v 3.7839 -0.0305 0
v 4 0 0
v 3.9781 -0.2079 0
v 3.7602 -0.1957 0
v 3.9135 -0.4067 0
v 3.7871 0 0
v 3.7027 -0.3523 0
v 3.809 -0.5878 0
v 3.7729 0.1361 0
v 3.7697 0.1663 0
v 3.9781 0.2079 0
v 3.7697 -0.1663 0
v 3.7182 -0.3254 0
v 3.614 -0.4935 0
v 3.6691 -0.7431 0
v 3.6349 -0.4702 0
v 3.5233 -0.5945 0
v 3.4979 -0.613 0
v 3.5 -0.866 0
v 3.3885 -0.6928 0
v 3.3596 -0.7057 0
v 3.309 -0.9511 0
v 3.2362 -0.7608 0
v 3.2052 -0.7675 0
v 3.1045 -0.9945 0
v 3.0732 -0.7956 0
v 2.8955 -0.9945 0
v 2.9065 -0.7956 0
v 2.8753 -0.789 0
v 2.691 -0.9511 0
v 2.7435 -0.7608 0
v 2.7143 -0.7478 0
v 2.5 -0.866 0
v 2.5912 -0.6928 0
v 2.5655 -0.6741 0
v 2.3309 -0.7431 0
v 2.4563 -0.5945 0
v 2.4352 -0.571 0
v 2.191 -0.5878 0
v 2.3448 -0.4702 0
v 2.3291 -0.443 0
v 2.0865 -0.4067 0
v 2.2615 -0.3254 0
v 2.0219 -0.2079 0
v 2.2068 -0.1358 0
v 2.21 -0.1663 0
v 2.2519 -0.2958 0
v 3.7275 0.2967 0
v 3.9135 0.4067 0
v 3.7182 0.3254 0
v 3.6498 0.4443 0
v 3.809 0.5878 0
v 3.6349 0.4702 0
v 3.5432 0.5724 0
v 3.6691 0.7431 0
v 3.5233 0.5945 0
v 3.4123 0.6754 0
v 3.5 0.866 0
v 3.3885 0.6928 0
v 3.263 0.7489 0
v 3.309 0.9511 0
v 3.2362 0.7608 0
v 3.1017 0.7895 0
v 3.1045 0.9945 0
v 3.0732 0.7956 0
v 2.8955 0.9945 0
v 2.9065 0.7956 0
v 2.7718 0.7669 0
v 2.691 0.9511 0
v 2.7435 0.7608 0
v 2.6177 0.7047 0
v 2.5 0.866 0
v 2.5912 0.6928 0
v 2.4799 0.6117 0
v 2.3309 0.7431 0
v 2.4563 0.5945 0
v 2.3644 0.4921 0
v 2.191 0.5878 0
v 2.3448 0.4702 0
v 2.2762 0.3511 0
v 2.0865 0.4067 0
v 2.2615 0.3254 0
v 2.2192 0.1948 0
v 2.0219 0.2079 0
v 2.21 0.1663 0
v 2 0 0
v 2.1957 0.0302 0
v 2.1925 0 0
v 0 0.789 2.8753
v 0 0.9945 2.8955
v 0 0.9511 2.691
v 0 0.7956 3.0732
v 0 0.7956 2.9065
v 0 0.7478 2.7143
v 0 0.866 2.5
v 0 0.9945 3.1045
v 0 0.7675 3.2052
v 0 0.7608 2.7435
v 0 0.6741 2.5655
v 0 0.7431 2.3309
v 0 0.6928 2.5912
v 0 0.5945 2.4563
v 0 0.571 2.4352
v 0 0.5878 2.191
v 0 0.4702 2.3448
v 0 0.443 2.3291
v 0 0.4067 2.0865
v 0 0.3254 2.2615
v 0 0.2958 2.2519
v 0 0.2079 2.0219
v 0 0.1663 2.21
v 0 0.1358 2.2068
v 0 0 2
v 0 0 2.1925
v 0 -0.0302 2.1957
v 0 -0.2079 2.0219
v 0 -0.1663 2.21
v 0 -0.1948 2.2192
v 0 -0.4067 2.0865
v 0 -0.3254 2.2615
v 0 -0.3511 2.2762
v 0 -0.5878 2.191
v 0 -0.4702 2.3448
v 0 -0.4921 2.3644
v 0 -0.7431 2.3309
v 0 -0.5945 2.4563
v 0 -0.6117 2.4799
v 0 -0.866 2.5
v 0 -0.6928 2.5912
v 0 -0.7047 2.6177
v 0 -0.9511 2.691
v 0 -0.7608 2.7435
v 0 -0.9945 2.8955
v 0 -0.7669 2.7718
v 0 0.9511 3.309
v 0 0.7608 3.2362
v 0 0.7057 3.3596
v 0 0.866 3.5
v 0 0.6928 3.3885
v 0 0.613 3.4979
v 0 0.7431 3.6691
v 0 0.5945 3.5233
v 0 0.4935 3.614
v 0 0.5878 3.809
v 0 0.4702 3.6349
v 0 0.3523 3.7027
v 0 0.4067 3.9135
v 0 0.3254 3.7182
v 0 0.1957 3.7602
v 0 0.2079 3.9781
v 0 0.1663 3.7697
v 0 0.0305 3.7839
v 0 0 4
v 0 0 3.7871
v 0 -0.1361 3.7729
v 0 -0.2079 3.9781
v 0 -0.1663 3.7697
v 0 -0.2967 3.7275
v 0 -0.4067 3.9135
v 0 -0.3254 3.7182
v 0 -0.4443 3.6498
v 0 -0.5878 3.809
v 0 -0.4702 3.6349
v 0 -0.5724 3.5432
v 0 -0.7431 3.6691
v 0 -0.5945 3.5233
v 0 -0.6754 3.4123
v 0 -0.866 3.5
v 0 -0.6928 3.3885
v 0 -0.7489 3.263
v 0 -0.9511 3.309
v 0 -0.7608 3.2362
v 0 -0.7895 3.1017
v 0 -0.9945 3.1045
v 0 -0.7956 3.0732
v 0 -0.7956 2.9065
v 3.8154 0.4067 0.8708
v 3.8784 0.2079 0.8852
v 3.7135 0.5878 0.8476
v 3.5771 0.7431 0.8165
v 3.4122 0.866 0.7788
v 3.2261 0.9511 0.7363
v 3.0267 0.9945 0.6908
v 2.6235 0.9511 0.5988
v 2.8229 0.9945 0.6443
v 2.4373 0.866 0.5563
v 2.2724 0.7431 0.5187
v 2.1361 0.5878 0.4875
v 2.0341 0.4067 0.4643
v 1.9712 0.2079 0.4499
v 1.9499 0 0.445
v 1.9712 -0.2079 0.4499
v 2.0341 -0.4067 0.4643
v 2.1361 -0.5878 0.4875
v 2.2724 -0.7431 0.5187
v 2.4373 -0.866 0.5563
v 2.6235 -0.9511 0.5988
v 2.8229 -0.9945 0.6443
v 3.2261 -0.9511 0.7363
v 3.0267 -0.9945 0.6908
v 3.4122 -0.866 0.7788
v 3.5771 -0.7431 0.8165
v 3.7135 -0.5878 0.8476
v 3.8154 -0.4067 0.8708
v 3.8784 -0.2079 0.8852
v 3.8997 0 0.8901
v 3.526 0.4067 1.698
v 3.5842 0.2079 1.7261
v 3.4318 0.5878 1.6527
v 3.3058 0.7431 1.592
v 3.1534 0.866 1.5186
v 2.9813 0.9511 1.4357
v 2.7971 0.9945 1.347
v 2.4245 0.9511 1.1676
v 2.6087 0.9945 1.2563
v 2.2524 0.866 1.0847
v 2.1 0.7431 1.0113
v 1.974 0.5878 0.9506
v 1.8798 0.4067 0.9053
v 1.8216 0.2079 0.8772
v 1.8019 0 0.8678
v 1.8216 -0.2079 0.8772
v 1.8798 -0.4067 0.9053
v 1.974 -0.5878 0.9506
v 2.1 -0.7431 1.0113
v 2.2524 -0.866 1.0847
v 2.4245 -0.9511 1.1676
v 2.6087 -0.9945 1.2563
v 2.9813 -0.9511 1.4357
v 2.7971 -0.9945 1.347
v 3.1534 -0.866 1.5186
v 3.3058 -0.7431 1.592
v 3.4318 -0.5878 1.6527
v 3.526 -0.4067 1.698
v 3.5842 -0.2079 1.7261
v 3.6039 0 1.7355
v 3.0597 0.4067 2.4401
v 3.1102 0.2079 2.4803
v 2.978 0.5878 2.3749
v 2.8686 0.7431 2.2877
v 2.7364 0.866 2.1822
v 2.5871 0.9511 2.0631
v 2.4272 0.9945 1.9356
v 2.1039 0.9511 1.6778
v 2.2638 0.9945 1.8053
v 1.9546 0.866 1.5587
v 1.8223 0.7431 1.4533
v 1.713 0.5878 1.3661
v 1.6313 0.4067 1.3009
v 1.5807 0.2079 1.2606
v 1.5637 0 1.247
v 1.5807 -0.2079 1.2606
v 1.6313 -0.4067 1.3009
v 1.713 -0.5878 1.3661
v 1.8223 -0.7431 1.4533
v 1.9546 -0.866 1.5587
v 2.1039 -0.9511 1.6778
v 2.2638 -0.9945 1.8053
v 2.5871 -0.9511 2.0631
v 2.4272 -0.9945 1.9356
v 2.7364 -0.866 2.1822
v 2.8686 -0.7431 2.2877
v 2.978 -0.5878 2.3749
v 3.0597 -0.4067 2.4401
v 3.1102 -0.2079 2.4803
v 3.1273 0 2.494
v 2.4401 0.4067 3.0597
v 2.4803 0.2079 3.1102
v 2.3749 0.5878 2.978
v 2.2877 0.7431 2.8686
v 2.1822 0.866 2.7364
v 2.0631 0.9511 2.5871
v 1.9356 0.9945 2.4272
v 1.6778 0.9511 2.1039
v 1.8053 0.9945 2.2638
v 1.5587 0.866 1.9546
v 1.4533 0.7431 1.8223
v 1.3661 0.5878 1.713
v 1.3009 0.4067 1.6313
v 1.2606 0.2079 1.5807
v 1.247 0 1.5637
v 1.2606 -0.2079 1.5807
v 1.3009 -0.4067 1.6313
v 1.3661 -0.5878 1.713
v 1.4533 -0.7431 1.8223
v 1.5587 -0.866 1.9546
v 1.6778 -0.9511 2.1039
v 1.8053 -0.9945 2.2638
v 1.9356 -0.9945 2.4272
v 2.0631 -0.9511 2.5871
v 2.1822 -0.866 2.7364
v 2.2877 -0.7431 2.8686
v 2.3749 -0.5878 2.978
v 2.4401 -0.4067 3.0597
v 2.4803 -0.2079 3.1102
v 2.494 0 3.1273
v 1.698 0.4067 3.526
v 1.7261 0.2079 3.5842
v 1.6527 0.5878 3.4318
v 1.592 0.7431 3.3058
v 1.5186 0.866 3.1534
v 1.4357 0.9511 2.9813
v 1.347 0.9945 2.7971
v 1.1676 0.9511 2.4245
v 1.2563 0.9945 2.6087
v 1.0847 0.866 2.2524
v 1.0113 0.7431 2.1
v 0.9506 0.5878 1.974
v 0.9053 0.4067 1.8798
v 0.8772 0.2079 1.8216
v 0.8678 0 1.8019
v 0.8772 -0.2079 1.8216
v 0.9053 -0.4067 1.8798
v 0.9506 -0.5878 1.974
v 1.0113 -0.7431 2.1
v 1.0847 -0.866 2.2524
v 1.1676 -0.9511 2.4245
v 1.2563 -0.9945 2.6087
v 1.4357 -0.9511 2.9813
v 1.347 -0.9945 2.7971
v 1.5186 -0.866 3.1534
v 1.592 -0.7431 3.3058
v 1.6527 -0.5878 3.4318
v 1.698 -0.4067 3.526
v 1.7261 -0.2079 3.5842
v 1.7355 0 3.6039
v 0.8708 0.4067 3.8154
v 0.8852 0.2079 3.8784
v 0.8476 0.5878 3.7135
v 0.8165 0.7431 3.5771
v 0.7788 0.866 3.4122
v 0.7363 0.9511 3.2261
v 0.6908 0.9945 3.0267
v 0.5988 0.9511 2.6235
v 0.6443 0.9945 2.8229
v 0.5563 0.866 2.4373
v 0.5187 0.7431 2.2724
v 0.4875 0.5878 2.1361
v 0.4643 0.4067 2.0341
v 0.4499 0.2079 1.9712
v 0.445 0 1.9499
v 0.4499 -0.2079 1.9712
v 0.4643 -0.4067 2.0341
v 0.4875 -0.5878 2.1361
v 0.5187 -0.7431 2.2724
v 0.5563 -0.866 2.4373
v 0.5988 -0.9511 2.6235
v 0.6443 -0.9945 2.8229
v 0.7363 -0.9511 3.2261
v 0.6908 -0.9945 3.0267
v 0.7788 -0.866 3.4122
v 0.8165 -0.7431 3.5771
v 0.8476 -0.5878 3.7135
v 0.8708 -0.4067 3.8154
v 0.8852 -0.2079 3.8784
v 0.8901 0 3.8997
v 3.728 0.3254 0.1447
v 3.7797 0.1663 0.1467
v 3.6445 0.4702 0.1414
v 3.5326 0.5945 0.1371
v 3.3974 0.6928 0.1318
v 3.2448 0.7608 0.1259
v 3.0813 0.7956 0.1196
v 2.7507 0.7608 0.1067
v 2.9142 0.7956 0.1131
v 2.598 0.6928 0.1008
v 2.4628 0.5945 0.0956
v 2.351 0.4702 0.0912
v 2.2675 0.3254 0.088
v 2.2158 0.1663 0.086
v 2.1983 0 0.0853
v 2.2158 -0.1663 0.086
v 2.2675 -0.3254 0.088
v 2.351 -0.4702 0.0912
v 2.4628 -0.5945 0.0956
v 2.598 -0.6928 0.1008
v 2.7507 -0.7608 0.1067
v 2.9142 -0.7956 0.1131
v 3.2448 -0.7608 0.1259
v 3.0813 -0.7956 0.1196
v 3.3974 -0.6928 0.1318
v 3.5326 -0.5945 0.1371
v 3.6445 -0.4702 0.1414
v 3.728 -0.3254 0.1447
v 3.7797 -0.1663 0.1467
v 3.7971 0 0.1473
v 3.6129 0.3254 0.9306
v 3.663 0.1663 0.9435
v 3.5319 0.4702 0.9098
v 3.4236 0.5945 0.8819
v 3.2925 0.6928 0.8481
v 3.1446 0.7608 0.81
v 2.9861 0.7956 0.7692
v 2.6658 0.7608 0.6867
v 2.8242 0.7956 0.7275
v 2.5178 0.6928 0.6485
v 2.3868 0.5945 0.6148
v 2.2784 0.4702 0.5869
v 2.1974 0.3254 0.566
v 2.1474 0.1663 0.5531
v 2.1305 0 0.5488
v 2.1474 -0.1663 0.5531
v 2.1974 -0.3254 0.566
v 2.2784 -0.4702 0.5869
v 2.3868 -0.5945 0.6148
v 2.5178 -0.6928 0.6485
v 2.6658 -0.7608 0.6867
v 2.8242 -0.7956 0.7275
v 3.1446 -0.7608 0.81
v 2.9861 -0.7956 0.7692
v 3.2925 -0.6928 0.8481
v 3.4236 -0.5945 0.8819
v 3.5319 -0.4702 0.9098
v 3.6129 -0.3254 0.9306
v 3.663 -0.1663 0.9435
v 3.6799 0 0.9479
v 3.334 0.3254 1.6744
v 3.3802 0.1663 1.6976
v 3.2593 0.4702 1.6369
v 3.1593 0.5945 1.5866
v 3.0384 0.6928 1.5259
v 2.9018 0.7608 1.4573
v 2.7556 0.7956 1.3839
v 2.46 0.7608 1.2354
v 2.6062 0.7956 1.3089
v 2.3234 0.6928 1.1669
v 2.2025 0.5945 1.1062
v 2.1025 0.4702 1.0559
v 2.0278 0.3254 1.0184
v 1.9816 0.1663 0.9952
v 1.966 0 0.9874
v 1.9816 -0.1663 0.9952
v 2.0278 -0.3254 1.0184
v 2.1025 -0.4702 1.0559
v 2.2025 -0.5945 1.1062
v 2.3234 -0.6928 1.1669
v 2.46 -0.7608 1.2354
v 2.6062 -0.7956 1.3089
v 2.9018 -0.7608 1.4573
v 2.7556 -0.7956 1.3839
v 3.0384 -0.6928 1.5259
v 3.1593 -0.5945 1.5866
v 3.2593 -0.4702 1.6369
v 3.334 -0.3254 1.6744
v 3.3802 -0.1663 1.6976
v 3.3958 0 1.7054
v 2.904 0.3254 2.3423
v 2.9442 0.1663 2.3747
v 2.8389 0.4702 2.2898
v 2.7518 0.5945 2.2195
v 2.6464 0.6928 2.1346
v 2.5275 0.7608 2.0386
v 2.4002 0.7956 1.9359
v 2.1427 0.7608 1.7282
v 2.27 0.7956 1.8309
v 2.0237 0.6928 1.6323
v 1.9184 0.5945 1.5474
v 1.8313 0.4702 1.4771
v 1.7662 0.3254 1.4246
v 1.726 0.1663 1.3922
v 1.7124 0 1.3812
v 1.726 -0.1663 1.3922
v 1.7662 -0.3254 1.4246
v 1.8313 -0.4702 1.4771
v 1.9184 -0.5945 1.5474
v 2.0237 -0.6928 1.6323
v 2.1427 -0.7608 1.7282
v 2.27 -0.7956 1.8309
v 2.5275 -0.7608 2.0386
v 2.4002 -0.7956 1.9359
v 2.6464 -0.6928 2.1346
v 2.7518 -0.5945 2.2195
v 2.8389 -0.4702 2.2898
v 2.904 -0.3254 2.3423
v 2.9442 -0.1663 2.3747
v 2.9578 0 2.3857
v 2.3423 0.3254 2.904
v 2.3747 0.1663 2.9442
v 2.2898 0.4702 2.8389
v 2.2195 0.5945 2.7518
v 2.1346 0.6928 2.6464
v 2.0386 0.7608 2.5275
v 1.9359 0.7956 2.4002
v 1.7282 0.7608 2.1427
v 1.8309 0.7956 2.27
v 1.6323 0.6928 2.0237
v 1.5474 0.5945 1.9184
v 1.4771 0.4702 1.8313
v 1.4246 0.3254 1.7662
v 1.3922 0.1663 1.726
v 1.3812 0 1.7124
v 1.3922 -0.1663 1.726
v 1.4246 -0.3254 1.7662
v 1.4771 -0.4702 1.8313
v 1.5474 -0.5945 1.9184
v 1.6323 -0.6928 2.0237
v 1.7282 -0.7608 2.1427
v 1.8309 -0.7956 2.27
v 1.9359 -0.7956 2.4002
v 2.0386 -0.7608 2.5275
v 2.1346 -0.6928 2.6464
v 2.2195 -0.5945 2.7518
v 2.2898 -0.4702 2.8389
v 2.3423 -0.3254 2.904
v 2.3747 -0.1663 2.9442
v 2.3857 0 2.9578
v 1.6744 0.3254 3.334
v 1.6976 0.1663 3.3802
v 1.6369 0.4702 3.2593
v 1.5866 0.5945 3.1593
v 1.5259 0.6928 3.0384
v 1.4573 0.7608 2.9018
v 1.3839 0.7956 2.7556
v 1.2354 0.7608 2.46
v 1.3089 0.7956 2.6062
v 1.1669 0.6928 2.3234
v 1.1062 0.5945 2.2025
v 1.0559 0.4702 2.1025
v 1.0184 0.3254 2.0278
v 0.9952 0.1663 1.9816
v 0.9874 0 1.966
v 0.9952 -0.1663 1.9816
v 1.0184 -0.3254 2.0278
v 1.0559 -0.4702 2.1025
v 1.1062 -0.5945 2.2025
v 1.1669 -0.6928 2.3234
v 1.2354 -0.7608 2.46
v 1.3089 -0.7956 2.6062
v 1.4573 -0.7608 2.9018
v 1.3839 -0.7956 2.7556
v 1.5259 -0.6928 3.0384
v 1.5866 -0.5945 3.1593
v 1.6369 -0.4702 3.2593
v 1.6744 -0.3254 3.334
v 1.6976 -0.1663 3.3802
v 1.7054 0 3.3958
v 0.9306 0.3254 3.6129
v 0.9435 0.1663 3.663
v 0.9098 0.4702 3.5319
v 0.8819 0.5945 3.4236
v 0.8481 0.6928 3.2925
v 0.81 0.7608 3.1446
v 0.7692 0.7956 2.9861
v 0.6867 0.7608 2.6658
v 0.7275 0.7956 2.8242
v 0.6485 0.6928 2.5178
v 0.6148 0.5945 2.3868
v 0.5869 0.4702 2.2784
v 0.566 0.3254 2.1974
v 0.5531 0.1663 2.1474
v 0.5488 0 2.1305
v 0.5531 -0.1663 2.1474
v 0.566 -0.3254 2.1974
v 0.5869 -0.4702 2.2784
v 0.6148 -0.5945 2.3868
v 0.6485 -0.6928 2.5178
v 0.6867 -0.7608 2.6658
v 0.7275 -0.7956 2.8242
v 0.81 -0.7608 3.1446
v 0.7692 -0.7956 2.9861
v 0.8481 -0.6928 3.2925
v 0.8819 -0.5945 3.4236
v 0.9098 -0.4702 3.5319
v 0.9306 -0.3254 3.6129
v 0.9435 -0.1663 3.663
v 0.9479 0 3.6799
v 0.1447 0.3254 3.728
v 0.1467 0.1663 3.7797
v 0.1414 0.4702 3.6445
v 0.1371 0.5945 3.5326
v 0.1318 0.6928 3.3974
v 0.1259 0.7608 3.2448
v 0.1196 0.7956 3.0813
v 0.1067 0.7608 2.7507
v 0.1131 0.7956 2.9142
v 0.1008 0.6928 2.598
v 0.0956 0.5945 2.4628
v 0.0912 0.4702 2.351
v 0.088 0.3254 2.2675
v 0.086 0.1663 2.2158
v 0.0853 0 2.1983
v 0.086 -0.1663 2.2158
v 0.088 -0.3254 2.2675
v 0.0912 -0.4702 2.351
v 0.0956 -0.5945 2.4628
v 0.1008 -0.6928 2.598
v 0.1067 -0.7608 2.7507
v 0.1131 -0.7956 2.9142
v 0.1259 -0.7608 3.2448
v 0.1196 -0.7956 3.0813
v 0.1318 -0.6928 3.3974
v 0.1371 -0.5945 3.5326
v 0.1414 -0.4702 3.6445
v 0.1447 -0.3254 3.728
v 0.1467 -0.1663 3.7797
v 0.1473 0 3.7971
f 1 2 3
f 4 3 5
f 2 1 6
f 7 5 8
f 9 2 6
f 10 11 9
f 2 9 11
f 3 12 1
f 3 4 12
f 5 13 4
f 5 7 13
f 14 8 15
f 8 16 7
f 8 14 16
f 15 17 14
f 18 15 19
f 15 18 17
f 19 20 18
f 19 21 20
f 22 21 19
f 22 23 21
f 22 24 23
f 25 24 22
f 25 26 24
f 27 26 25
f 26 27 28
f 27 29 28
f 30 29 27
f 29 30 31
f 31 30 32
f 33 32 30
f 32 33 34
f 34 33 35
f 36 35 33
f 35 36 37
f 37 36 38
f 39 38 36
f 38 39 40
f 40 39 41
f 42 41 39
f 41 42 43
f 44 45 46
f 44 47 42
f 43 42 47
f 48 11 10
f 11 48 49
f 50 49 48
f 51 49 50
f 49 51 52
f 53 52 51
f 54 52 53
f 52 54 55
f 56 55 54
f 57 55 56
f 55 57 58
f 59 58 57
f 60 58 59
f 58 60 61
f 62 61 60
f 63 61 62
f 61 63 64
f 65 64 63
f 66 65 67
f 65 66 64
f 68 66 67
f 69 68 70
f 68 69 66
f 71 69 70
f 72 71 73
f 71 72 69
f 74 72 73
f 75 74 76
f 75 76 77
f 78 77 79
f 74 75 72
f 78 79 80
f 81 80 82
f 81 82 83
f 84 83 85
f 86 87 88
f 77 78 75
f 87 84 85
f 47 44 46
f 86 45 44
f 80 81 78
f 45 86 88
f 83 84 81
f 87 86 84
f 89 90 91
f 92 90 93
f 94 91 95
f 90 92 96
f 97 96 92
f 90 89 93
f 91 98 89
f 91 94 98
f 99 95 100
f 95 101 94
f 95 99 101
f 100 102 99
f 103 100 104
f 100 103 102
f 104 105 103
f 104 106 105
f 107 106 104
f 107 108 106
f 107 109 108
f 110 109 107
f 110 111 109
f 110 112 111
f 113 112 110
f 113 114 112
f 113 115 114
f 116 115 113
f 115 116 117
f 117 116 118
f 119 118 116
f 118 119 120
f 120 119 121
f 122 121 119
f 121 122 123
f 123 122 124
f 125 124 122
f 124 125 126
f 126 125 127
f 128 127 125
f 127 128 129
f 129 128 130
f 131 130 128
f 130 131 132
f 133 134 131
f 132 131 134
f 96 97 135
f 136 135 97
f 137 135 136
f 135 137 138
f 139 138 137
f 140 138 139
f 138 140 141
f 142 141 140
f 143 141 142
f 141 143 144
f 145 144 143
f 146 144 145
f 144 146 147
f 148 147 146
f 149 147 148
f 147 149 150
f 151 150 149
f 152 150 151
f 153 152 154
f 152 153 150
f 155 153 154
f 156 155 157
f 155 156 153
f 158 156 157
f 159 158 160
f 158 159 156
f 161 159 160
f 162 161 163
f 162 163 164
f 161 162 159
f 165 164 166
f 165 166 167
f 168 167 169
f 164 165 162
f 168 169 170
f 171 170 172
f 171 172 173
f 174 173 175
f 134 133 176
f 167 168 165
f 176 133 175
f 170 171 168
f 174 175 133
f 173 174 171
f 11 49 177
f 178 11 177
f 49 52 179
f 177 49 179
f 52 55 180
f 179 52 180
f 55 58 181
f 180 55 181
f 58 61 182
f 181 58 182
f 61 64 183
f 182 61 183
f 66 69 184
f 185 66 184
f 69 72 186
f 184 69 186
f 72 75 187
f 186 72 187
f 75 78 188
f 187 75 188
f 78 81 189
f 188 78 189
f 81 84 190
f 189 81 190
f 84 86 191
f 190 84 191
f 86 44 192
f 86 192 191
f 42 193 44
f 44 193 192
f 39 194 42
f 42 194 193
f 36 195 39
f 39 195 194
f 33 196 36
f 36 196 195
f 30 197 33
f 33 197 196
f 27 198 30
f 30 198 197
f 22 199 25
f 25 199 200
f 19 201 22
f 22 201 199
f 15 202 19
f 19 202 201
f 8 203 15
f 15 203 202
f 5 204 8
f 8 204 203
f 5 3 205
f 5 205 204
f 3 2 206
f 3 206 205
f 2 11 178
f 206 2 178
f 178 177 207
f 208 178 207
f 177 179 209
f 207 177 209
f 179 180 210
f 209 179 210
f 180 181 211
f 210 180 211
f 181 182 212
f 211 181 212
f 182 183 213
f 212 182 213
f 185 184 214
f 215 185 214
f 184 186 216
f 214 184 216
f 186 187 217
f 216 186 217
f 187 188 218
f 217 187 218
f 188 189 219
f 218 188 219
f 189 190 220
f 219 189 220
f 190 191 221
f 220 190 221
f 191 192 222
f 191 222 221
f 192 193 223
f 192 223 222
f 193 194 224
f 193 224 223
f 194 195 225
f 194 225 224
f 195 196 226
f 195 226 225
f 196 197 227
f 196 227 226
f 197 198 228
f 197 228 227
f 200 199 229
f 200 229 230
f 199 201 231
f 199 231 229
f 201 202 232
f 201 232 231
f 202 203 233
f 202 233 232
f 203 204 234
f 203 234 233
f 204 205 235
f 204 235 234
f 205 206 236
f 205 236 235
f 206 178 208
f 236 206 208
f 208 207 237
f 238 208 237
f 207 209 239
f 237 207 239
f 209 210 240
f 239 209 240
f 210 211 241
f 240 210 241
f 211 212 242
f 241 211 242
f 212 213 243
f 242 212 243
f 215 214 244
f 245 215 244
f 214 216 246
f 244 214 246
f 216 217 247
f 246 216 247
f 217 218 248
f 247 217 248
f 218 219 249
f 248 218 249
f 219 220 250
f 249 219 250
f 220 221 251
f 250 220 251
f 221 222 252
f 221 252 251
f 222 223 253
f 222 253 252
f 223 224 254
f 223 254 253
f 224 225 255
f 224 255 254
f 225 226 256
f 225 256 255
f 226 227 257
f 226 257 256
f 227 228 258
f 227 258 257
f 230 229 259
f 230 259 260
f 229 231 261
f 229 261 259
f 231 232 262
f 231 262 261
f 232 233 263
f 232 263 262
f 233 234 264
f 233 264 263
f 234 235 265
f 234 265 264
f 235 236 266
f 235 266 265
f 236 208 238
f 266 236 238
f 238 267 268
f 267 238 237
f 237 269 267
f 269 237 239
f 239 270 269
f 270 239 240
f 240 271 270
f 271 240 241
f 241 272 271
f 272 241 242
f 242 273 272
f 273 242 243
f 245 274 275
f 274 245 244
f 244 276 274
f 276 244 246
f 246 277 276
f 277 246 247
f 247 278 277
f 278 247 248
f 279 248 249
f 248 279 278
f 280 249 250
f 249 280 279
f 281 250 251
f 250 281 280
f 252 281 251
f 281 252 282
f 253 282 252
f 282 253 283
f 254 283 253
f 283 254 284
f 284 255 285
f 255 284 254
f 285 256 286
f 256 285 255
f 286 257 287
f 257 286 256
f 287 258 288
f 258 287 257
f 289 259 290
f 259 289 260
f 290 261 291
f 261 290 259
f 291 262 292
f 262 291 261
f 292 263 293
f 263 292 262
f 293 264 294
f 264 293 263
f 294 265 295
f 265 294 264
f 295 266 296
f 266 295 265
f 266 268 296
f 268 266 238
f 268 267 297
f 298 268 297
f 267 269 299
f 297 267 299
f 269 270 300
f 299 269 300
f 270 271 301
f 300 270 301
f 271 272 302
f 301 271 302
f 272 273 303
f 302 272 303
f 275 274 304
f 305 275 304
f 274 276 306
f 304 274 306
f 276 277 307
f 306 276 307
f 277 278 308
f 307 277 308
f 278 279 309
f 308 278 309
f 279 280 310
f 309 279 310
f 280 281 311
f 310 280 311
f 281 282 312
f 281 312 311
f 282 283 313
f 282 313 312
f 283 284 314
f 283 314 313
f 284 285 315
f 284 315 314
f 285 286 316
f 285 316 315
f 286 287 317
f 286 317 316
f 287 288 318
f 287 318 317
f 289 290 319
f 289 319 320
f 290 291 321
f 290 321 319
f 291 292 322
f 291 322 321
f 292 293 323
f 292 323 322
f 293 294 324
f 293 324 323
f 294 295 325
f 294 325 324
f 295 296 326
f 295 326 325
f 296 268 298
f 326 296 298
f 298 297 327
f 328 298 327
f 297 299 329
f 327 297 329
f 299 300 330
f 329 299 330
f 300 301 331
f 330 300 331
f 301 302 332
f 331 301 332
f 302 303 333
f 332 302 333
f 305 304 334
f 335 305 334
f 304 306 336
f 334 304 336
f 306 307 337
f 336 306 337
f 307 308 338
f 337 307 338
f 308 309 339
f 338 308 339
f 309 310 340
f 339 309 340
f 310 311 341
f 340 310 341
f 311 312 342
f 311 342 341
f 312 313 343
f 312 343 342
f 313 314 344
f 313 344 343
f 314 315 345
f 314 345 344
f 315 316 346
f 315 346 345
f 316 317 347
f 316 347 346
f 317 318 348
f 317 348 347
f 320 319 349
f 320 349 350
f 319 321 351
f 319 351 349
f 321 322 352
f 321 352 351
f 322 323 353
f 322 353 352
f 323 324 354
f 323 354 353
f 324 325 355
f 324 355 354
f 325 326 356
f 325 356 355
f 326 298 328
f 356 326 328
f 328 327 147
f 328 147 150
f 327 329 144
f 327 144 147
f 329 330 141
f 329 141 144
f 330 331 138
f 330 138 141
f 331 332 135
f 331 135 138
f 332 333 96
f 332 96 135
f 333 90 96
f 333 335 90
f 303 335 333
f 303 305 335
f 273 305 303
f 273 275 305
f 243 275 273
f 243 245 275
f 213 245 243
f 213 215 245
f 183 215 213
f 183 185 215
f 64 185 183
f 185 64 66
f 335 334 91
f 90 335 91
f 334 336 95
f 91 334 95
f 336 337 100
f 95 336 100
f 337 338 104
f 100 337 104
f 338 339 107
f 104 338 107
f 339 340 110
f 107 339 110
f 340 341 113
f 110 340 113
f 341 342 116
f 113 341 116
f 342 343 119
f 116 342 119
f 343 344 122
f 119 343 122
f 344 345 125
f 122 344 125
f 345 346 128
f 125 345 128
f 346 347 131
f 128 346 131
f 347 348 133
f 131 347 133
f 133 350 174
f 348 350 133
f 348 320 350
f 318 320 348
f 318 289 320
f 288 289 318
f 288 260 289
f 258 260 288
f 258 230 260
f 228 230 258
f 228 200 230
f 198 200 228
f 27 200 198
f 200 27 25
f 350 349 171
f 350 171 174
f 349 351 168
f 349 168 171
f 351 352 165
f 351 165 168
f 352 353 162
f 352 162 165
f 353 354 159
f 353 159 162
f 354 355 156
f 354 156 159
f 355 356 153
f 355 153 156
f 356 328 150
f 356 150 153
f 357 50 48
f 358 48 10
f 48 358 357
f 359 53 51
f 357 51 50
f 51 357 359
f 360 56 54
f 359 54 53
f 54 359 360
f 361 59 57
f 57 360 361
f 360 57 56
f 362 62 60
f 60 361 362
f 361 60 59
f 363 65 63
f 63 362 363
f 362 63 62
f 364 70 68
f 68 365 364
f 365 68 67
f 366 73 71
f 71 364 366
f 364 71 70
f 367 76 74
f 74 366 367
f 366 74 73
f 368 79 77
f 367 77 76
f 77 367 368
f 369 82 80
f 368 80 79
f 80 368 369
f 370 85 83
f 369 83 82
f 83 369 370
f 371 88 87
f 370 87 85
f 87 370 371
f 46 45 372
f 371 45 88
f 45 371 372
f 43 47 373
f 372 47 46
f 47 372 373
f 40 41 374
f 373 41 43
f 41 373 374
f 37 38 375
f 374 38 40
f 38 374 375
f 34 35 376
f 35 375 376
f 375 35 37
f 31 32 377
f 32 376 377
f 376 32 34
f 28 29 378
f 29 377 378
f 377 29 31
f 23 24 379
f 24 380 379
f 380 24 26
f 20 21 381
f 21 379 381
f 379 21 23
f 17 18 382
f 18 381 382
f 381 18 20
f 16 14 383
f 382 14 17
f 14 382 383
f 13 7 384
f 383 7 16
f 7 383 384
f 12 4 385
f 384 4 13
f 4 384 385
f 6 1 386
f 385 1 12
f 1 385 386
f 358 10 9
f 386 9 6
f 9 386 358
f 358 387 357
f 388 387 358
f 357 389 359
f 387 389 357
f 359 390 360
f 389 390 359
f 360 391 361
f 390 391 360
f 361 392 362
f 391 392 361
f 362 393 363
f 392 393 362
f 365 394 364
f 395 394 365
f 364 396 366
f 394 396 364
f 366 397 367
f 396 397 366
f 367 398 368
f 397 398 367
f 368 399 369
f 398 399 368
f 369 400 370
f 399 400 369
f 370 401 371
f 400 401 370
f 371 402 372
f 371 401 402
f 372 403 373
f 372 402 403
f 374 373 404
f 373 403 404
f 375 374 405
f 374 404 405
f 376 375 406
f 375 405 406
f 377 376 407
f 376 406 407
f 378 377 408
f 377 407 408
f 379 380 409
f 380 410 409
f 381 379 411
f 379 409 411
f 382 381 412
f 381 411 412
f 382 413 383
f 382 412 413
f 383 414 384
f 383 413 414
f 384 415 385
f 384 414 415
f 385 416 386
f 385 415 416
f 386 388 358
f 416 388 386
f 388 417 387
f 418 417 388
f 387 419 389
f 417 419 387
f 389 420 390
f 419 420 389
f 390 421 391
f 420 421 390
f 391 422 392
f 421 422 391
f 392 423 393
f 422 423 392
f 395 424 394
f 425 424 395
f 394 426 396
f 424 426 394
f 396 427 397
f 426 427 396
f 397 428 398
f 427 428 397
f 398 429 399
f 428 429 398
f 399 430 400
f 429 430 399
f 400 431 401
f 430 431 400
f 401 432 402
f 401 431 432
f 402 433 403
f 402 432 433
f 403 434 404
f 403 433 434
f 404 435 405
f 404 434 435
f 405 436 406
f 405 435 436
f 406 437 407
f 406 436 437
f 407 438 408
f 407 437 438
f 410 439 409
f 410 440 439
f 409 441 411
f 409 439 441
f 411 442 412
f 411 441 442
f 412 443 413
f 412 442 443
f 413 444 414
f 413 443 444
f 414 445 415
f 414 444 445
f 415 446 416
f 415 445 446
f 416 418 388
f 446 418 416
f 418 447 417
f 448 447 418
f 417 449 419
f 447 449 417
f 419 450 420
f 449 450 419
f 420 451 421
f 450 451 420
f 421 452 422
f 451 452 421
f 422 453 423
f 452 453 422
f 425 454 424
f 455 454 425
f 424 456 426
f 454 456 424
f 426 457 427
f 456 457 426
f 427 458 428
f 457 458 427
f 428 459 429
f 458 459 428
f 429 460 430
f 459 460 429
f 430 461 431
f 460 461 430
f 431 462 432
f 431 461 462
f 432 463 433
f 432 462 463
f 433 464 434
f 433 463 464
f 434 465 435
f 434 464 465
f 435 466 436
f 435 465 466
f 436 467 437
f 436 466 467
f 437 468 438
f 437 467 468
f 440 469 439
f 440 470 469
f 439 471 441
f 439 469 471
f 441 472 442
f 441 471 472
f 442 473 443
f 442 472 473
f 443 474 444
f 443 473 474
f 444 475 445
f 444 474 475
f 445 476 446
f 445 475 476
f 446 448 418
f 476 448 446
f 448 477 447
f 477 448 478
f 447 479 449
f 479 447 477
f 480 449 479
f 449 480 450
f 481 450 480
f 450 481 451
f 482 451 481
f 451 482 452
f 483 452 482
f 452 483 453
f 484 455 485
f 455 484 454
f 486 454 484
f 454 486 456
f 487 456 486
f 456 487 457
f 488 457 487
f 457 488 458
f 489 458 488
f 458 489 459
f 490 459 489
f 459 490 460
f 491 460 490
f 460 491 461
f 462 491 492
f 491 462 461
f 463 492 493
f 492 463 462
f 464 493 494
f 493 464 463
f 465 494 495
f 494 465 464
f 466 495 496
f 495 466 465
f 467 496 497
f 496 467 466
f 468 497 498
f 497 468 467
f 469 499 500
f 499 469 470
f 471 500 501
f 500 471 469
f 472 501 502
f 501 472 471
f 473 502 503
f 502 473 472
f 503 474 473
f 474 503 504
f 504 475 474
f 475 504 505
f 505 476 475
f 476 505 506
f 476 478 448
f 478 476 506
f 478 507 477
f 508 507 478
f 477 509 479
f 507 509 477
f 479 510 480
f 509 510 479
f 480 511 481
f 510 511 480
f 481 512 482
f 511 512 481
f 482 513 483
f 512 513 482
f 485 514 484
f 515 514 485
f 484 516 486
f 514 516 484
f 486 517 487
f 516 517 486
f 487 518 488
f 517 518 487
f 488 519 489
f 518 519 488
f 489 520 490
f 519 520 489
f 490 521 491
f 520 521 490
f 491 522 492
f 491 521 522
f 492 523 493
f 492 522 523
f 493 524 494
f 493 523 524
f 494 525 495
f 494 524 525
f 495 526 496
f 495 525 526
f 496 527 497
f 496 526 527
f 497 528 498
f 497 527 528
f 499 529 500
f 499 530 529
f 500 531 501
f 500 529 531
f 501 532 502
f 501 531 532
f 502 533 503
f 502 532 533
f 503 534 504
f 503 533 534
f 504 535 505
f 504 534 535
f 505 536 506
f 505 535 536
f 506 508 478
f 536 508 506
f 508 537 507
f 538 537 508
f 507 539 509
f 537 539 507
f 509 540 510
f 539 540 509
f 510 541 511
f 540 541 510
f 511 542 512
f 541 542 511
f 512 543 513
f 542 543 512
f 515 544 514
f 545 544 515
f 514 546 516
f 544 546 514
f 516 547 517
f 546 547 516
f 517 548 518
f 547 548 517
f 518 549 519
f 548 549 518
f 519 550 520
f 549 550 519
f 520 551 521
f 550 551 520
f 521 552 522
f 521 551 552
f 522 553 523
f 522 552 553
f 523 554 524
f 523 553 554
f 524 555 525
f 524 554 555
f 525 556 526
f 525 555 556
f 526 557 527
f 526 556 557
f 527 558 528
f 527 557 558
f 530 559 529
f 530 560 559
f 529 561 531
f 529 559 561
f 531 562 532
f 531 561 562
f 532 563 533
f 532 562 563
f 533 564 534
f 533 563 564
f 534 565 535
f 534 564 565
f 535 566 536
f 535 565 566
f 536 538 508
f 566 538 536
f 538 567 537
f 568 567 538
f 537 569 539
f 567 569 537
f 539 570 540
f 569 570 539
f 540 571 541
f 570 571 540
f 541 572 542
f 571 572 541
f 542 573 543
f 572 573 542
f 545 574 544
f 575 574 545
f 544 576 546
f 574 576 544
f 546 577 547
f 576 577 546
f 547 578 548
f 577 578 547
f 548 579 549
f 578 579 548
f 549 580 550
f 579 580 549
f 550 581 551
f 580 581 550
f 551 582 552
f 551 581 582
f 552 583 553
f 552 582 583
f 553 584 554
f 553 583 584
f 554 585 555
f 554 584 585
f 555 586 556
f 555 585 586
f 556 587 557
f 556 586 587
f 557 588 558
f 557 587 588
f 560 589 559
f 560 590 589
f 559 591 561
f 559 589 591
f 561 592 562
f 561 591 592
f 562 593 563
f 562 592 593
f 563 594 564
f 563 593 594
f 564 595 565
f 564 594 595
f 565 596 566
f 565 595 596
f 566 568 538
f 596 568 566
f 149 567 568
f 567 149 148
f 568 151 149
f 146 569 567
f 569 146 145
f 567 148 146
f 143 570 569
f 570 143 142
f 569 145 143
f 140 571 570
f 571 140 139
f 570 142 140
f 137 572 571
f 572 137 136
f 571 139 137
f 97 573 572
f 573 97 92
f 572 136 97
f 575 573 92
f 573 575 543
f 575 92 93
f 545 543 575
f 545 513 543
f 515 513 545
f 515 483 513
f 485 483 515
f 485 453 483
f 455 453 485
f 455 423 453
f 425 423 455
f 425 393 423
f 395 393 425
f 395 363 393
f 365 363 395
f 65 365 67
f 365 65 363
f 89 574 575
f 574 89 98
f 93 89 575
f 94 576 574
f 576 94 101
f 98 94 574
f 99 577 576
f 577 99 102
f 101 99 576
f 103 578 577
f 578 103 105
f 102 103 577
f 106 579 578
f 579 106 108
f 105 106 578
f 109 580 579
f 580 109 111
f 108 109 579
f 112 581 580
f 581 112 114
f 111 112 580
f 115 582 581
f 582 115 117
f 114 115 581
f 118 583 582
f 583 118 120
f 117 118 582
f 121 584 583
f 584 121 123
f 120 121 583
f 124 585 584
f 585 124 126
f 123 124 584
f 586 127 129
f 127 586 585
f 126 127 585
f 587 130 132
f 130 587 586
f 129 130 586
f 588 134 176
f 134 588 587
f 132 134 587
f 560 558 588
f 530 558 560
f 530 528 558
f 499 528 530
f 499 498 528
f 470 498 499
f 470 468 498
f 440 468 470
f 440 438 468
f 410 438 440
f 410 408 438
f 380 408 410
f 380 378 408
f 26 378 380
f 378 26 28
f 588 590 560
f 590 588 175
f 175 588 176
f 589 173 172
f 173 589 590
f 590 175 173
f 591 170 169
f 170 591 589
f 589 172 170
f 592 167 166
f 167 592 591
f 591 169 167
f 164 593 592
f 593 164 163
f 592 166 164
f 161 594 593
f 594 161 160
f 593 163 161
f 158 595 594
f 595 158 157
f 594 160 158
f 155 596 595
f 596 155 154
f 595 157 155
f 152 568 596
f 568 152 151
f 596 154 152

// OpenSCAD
// Nicolì Angelo 2023 - THIS CODE IS LICENSED AS GPL-2.0

module pipe(raggio,angolo){
rotate([90,0,0])
rotate_extrude(angle=angolo, $fn = $preview? 90: 30) 
translate([3, 0, 0])
circle(r = raggio, $fn = $preview? 90: 30);
}

difference(){
   translate([0,0])
   pipe(1,90);
   
   rotate([0,10,0])
   translate([0,0])
   pipe(0.8,110);
 }


module repeat(){
difference(){
 for (i =[-1:1]){
     translate([0,5*i,0])
     ring(1,90);
 }
 
 for (i =[-1:1]){
    rotate([0,10,0])
     translate([0,5*i,0])
     ring(0.8,110);
 }
 
}
}
